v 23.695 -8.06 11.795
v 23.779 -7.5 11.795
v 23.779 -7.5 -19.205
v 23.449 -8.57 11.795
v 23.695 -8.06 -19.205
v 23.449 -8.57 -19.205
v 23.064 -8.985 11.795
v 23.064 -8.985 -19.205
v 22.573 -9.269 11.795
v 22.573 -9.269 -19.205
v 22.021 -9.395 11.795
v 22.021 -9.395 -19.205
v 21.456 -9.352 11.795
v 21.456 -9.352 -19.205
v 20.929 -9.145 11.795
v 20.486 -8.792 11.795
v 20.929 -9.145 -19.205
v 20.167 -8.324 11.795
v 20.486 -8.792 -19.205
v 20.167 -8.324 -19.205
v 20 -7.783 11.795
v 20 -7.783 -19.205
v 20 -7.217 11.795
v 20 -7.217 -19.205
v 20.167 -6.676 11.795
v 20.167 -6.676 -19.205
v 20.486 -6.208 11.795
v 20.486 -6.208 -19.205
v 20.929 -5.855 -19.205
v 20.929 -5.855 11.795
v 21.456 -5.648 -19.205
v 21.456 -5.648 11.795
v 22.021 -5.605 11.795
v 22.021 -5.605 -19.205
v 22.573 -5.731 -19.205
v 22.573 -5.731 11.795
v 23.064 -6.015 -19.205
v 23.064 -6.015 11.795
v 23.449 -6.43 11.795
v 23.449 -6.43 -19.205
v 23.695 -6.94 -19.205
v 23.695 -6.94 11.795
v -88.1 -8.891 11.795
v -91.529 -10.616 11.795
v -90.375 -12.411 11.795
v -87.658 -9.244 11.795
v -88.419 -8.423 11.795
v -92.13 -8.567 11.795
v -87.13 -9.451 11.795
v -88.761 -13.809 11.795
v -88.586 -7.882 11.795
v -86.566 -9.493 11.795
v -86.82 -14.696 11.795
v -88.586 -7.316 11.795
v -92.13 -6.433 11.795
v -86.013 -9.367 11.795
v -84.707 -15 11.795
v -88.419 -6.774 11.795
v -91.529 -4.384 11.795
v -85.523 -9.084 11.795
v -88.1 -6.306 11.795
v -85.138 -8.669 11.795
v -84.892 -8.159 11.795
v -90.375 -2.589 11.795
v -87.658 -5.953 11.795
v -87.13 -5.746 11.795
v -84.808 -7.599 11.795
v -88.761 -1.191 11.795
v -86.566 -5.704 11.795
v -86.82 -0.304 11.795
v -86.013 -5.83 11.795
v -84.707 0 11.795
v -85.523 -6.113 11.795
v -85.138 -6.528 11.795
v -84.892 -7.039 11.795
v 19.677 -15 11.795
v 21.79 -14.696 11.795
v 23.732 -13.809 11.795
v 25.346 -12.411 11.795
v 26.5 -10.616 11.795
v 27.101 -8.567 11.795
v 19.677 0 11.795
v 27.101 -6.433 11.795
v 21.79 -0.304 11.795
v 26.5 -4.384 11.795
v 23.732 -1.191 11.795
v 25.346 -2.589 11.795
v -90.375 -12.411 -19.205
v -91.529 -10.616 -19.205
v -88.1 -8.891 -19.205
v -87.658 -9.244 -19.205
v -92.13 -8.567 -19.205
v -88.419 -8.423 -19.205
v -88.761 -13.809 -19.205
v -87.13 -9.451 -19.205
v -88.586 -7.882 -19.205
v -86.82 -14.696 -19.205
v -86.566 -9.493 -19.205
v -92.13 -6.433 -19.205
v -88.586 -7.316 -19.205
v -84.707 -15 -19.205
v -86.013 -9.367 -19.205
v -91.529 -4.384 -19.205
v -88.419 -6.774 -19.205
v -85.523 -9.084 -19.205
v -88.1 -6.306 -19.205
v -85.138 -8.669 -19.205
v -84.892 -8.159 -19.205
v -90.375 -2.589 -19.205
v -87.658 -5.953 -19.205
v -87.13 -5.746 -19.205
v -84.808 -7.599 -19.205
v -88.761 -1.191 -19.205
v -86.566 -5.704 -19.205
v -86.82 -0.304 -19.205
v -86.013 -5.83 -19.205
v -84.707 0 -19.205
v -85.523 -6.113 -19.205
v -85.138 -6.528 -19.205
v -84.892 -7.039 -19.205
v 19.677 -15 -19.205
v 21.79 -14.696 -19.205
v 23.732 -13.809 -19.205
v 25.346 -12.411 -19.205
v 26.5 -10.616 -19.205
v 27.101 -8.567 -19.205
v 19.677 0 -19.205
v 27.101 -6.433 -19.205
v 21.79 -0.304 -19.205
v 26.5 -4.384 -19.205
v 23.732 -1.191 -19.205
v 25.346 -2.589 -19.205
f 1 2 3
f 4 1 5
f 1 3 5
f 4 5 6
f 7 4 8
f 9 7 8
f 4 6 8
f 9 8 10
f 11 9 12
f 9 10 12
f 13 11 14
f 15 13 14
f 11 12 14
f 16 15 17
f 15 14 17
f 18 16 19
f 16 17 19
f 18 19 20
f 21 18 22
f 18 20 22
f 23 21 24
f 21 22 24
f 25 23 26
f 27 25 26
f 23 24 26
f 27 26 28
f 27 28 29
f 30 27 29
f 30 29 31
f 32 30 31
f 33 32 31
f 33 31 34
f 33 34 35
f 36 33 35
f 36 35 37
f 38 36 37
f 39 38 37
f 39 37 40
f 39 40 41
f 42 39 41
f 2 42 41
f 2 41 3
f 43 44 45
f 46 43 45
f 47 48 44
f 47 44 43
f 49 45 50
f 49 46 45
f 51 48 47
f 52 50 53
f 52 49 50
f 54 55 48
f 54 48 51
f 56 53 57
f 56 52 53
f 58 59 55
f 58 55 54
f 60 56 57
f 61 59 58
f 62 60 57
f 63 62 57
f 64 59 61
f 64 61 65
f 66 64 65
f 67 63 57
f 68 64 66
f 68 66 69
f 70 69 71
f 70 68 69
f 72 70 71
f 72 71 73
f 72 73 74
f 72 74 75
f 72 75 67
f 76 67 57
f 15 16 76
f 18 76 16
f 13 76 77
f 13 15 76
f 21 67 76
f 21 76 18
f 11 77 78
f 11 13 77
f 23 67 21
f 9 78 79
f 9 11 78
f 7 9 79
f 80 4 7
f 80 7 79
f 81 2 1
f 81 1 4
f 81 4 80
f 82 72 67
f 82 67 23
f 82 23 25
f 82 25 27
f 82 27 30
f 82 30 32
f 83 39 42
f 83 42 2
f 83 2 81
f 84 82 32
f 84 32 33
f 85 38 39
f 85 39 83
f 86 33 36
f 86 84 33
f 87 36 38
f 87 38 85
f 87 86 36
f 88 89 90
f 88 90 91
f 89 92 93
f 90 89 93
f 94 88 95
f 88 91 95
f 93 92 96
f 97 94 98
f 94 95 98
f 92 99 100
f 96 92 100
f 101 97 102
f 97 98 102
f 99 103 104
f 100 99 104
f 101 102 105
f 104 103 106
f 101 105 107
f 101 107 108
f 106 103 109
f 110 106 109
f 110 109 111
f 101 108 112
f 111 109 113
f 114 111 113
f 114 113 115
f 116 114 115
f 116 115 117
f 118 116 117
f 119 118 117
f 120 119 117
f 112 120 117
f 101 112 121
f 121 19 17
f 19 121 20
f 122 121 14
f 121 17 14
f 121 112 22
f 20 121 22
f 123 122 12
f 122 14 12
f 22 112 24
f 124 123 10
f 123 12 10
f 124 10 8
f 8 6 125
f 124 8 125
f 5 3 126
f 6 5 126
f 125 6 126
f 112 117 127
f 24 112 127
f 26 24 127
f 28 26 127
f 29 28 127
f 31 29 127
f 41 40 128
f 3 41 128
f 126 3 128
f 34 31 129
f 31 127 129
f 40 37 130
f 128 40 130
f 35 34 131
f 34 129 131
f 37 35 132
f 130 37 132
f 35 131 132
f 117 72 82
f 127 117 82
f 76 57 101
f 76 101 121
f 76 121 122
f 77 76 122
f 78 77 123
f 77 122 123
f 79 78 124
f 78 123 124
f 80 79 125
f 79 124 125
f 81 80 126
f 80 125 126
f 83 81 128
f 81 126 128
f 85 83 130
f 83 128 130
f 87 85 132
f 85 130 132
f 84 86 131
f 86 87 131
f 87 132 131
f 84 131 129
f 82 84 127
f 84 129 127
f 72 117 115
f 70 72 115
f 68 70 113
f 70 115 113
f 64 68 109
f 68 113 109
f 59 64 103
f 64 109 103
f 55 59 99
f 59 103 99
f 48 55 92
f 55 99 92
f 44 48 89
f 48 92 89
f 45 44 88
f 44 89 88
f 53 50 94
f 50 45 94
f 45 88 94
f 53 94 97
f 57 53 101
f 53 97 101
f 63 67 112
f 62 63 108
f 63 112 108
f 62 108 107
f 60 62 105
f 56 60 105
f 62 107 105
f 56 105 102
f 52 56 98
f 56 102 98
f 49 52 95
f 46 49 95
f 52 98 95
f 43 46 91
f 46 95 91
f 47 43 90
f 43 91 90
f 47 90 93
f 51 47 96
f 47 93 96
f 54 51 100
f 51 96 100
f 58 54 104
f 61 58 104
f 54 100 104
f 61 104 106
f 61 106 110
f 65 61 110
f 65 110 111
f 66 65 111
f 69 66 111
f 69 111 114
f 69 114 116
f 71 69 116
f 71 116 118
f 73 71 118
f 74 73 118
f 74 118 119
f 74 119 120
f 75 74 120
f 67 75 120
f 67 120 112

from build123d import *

# Parameters (mm, degrees)
F0_W     = 120
F0_H     = 31
F1_DEPTH = 15
F2_R     = 1.9
F3_DEPTH = 60
F5_DEPTH = 70
F6_R     = 1.9
F7_DEPTH = 80
F9_DEPTH = 70


with BuildPart() as f1:
    # F0 (on Front) → F1 (new body)
    with BuildSketch(Plane.XZ):
        with Locations((-32.620786, -3.705296)):
            Rectangle(F0_W, F0_H)
    extrude(amount=F1_DEPTH)

    # F2 (on face) → F3 (cut)
    with BuildSketch(Plane(origin=(0, 0, -19.205296), x_dir=(1, 0, 0), z_dir=(0, 0, -1))):
        with Locations((21.879214, 7.5)):
            Circle(F2_R)
    extrude(amount=-F3_DEPTH, mode=Mode.SUBTRACT)

    # F4 (on face) → F5 (cut)
    with BuildSketch(Plane(origin=(0, 0, -19.205296), x_dir=(1, 0, 0), z_dir=(0, 0, -1))):
        with BuildLine():
            ThreePointArc((-84.706673, 0), (-92.206673, 7.5), (-84.706673, 15))
            Line((-84.706673, 15), (-92.620786, 15))
            Line((-92.620786, 15), (-92.620786, 0))
            Line((-92.620786, 0), (-84.706673, 0))
        make_face()
    extrude(amount=-F5_DEPTH, mode=Mode.SUBTRACT)

    # F6 (on face) → F7 (cut)
    with BuildSketch(Plane(origin=(0, 0, -19.205296), x_dir=(1, 0, 0), z_dir=(0, 0, -1))):
        with Locations((-86.707558, 7.5987)):
            Circle(F6_R)
    extrude(amount=-F7_DEPTH, mode=Mode.SUBTRACT)

    # F8 (on face) → F9 (cut)
    with BuildSketch(Plane(origin=(0, 0, -19.205296), x_dir=(1, 0, 0), z_dir=(0, 0, -1))):
        with BuildLine():
            ThreePointArc((19.677406, 15), (27.177406, 7.5), (19.677406, 0))
            Line((19.677406, 0), (27.379214, 0))
            Line((27.379214, 0), (27.379214, 15))
            Line((27.379214, 15), (19.677406, 15))
        make_face()
    extrude(amount=-F9_DEPTH, mode=Mode.SUBTRACT)


solid = f1.part
